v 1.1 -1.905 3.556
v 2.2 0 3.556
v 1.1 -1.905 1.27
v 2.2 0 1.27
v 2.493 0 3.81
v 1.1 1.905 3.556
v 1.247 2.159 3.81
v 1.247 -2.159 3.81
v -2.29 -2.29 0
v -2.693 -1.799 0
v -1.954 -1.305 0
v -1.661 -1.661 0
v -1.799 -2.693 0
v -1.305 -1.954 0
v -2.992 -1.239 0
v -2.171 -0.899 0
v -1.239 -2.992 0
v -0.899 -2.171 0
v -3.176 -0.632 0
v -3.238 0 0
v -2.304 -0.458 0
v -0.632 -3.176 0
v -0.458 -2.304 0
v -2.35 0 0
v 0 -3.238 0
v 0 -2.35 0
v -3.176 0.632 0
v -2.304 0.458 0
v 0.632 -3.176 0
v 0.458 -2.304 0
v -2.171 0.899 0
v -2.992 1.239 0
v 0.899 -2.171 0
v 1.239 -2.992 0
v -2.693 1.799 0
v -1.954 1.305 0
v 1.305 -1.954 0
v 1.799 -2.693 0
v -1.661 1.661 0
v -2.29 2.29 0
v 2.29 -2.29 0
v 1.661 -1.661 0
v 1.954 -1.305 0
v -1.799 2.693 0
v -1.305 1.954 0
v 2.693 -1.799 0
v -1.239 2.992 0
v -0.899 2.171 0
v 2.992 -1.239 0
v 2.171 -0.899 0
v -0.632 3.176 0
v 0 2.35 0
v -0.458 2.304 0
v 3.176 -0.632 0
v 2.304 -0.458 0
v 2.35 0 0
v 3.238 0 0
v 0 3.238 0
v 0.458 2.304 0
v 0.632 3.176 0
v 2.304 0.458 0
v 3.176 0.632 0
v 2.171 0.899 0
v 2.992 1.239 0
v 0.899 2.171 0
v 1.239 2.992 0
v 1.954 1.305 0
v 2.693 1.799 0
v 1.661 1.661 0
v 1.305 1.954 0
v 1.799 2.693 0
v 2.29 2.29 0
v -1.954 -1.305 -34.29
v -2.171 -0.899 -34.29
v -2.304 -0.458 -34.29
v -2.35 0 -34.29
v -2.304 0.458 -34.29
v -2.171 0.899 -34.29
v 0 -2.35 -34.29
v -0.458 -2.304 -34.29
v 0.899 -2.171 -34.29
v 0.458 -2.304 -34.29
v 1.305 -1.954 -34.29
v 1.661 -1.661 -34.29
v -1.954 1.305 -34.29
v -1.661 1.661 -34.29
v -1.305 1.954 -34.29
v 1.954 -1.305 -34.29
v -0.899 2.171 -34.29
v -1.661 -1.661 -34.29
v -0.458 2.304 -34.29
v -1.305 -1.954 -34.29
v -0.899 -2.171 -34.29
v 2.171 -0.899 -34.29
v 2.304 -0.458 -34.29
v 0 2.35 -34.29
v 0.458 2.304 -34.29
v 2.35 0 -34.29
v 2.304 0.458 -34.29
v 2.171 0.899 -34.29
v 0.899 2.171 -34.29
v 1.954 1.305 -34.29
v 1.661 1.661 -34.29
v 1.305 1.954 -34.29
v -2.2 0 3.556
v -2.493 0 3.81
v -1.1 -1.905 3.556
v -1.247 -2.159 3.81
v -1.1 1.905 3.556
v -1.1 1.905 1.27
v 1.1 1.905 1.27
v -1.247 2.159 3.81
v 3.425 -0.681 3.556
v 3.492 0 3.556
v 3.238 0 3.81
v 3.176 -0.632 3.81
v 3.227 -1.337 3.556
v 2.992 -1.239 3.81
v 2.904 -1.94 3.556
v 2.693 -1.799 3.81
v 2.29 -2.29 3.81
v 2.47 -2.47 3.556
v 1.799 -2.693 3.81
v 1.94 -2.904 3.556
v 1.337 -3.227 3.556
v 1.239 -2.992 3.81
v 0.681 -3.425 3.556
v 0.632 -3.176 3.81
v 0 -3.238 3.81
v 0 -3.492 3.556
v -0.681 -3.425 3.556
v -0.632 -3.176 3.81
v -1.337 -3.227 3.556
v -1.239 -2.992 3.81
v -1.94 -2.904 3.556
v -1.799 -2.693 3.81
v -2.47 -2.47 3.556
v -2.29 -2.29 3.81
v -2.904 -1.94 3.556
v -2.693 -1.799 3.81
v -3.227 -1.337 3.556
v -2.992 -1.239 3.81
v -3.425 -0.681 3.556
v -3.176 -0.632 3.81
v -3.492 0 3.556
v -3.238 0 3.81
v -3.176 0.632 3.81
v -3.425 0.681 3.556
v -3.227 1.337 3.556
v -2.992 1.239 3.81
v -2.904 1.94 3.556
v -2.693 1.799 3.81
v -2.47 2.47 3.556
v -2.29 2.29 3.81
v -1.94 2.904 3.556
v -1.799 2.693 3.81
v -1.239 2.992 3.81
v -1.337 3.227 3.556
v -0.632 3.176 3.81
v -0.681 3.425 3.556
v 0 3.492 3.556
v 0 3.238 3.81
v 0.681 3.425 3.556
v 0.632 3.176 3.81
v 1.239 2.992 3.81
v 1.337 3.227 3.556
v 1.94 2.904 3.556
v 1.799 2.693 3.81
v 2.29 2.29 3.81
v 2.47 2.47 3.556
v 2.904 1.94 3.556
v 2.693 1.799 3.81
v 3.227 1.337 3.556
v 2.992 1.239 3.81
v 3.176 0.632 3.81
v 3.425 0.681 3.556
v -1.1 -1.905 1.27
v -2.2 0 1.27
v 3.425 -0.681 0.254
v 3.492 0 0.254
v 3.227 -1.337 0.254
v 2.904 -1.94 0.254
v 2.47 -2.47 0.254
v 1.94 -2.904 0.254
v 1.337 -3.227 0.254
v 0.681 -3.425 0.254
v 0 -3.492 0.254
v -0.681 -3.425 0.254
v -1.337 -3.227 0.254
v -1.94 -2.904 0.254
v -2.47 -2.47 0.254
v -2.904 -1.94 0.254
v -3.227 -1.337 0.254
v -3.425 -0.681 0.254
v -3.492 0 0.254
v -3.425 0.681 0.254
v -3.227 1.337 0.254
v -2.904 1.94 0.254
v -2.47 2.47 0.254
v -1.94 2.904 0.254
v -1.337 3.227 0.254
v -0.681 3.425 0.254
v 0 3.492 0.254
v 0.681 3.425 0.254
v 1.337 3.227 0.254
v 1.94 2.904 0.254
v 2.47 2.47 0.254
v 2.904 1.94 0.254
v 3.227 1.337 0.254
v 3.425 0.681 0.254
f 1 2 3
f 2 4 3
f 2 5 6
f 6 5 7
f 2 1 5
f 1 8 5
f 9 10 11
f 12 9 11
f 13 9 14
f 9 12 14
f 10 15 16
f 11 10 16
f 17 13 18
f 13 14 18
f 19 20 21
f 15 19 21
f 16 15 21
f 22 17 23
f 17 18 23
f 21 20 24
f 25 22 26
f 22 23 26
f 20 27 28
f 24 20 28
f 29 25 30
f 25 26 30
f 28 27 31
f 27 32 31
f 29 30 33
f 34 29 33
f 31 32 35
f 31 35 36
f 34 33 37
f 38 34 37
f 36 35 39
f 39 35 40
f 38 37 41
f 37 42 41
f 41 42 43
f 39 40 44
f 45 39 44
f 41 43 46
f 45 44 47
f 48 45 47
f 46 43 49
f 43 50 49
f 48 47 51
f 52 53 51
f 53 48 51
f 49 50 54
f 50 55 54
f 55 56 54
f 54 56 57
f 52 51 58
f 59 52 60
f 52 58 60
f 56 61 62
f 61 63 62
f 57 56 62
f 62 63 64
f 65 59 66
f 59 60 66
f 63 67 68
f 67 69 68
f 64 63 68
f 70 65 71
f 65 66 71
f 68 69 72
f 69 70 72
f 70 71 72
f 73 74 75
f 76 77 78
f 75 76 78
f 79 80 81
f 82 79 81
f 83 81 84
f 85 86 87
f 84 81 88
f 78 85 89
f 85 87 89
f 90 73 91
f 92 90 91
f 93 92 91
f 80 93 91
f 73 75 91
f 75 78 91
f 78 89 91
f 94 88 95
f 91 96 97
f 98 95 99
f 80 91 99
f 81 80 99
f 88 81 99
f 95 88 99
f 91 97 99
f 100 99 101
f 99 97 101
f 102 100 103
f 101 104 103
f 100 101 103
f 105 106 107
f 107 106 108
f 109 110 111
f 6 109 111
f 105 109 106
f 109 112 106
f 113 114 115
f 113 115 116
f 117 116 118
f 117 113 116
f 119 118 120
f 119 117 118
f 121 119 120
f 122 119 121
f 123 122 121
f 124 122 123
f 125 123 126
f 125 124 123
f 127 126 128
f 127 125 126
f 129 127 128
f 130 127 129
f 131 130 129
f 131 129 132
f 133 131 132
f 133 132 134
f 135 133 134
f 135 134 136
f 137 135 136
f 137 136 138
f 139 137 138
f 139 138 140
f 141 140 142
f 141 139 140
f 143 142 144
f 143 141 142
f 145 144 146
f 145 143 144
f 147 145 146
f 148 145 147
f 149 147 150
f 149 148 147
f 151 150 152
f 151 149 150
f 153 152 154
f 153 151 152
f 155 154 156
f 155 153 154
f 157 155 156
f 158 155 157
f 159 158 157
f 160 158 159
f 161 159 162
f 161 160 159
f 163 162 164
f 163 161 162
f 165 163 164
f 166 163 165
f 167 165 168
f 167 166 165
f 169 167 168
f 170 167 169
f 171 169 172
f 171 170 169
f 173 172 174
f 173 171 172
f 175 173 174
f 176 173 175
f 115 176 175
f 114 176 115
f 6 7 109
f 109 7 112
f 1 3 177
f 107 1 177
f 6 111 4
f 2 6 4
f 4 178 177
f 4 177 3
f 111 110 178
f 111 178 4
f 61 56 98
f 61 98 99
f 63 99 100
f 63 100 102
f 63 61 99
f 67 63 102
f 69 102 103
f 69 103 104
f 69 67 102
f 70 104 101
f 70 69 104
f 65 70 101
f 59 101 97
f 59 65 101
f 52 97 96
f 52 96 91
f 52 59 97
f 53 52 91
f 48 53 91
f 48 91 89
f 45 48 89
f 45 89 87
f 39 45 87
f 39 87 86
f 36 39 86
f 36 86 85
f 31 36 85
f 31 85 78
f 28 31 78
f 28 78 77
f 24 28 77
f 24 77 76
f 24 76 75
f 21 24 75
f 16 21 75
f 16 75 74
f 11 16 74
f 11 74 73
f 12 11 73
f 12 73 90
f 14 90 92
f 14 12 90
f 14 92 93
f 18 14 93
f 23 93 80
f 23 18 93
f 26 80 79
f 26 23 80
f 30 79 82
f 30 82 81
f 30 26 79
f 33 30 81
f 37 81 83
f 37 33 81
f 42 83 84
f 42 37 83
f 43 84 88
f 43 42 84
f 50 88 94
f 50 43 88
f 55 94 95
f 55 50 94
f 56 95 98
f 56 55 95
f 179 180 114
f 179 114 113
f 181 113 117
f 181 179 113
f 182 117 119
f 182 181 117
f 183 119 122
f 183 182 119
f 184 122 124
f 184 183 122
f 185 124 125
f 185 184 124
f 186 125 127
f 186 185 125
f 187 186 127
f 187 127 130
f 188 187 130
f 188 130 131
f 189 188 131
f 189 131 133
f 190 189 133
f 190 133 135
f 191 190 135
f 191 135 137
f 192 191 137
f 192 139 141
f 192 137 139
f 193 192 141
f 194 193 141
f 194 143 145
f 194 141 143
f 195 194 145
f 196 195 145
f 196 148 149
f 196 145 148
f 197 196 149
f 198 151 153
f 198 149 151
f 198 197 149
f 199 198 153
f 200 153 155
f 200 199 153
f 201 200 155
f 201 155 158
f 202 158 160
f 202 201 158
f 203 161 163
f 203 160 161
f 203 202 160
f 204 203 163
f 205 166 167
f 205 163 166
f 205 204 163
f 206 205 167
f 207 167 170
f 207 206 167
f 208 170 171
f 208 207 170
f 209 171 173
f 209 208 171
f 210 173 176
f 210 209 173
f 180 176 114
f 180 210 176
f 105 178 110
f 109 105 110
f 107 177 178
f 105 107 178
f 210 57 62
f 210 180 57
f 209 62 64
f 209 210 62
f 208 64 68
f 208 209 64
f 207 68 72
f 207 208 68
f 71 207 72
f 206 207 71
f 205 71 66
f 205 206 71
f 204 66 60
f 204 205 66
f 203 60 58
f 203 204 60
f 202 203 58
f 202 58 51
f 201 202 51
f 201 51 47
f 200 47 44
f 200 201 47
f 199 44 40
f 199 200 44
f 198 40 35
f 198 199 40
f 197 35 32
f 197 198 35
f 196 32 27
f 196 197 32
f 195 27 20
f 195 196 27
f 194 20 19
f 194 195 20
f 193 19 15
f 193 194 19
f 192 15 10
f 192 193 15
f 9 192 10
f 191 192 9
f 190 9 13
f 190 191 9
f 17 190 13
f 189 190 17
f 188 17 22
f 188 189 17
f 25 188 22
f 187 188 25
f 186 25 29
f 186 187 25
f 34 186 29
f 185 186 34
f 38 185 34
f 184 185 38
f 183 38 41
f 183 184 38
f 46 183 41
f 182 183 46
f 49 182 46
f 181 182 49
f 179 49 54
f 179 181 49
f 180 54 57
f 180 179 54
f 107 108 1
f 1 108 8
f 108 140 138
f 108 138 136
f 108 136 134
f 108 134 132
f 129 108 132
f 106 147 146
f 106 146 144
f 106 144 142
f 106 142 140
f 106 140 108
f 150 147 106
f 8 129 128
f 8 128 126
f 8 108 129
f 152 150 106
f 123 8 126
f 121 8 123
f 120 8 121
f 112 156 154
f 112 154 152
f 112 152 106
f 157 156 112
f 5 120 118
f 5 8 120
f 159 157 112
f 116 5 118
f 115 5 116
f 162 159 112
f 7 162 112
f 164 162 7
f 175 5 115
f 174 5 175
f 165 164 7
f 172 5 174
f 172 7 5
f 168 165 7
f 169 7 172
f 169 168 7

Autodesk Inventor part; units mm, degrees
ref_plane "YZ Plane" through (0, 0, 0) normal (1, 0, 0) x (0, 1, 0)
ref_plane "XZ Plane" through (0, 0, 0) normal (0, 1, 0) x (-1, 0, 0)
ref_plane "XY Plane" through (0, 0, 0) normal (0, 0, 1) x (1, 0, 0)
sketch "Sketch1" plane through (0, 0, 0) normal (0, 0, 1) x (1, 0, 0)
  circle A0 centre (0, 0) radius 3.4925
  circle A1 centre (0, 0) radius 2.3495
  line L0 (2.1997, 0) -> (1.0999, -1.905)
  line L1 (1.0999, -1.905) -> (-1.0999, -1.905)
  line L2 (-1.0999, -1.905) -> (-2.1997, 0)
  line L3 (-2.1997, 0) -> (-1.0999, 1.905)
  line L4 (-1.0999, 1.905) -> (1.0999, 1.905)
  line L5 (1.0999, 1.905) -> (2.1997, 0)
  dimension "d0" = 6.985
  dimension "d1" = 4.699
  dimension "d2" = 3.81
extrude "Extrusion1" add sketch "Sketch1" along normal blind 3.81 contours A0 | A1
extrude "Extrusion2" add sketch "Sketch1" against normal blind 34.29 contours A1 | L0 L1 L2 L3 L4 L5
extrude "Extrusion3" add sketch "Sketch1" along normal blind 1.27 contours L0 L1 L2 L3 L4 L5
thread "Thread1" size "10-32 UNF" class "2A" standard "ANSI Unified Screw Threads" full length
chamfer "Chamfer1" distance 0.254 angle 45 8 edges at (-3.4925, 0, 3.81) (-3.4925, 0, 0) (-1.6498, 0.9525, 3.81) (-1.6498, -0.9525, 3.81) (0, -1.905, 3.81) (1.6498, -0.9525, 3.81) (1.6498, 0.9525, 3.81) (0, 1.905, 3.81)
properties part number "Gearbox Hex Machine Screw 2" material "Steel"
